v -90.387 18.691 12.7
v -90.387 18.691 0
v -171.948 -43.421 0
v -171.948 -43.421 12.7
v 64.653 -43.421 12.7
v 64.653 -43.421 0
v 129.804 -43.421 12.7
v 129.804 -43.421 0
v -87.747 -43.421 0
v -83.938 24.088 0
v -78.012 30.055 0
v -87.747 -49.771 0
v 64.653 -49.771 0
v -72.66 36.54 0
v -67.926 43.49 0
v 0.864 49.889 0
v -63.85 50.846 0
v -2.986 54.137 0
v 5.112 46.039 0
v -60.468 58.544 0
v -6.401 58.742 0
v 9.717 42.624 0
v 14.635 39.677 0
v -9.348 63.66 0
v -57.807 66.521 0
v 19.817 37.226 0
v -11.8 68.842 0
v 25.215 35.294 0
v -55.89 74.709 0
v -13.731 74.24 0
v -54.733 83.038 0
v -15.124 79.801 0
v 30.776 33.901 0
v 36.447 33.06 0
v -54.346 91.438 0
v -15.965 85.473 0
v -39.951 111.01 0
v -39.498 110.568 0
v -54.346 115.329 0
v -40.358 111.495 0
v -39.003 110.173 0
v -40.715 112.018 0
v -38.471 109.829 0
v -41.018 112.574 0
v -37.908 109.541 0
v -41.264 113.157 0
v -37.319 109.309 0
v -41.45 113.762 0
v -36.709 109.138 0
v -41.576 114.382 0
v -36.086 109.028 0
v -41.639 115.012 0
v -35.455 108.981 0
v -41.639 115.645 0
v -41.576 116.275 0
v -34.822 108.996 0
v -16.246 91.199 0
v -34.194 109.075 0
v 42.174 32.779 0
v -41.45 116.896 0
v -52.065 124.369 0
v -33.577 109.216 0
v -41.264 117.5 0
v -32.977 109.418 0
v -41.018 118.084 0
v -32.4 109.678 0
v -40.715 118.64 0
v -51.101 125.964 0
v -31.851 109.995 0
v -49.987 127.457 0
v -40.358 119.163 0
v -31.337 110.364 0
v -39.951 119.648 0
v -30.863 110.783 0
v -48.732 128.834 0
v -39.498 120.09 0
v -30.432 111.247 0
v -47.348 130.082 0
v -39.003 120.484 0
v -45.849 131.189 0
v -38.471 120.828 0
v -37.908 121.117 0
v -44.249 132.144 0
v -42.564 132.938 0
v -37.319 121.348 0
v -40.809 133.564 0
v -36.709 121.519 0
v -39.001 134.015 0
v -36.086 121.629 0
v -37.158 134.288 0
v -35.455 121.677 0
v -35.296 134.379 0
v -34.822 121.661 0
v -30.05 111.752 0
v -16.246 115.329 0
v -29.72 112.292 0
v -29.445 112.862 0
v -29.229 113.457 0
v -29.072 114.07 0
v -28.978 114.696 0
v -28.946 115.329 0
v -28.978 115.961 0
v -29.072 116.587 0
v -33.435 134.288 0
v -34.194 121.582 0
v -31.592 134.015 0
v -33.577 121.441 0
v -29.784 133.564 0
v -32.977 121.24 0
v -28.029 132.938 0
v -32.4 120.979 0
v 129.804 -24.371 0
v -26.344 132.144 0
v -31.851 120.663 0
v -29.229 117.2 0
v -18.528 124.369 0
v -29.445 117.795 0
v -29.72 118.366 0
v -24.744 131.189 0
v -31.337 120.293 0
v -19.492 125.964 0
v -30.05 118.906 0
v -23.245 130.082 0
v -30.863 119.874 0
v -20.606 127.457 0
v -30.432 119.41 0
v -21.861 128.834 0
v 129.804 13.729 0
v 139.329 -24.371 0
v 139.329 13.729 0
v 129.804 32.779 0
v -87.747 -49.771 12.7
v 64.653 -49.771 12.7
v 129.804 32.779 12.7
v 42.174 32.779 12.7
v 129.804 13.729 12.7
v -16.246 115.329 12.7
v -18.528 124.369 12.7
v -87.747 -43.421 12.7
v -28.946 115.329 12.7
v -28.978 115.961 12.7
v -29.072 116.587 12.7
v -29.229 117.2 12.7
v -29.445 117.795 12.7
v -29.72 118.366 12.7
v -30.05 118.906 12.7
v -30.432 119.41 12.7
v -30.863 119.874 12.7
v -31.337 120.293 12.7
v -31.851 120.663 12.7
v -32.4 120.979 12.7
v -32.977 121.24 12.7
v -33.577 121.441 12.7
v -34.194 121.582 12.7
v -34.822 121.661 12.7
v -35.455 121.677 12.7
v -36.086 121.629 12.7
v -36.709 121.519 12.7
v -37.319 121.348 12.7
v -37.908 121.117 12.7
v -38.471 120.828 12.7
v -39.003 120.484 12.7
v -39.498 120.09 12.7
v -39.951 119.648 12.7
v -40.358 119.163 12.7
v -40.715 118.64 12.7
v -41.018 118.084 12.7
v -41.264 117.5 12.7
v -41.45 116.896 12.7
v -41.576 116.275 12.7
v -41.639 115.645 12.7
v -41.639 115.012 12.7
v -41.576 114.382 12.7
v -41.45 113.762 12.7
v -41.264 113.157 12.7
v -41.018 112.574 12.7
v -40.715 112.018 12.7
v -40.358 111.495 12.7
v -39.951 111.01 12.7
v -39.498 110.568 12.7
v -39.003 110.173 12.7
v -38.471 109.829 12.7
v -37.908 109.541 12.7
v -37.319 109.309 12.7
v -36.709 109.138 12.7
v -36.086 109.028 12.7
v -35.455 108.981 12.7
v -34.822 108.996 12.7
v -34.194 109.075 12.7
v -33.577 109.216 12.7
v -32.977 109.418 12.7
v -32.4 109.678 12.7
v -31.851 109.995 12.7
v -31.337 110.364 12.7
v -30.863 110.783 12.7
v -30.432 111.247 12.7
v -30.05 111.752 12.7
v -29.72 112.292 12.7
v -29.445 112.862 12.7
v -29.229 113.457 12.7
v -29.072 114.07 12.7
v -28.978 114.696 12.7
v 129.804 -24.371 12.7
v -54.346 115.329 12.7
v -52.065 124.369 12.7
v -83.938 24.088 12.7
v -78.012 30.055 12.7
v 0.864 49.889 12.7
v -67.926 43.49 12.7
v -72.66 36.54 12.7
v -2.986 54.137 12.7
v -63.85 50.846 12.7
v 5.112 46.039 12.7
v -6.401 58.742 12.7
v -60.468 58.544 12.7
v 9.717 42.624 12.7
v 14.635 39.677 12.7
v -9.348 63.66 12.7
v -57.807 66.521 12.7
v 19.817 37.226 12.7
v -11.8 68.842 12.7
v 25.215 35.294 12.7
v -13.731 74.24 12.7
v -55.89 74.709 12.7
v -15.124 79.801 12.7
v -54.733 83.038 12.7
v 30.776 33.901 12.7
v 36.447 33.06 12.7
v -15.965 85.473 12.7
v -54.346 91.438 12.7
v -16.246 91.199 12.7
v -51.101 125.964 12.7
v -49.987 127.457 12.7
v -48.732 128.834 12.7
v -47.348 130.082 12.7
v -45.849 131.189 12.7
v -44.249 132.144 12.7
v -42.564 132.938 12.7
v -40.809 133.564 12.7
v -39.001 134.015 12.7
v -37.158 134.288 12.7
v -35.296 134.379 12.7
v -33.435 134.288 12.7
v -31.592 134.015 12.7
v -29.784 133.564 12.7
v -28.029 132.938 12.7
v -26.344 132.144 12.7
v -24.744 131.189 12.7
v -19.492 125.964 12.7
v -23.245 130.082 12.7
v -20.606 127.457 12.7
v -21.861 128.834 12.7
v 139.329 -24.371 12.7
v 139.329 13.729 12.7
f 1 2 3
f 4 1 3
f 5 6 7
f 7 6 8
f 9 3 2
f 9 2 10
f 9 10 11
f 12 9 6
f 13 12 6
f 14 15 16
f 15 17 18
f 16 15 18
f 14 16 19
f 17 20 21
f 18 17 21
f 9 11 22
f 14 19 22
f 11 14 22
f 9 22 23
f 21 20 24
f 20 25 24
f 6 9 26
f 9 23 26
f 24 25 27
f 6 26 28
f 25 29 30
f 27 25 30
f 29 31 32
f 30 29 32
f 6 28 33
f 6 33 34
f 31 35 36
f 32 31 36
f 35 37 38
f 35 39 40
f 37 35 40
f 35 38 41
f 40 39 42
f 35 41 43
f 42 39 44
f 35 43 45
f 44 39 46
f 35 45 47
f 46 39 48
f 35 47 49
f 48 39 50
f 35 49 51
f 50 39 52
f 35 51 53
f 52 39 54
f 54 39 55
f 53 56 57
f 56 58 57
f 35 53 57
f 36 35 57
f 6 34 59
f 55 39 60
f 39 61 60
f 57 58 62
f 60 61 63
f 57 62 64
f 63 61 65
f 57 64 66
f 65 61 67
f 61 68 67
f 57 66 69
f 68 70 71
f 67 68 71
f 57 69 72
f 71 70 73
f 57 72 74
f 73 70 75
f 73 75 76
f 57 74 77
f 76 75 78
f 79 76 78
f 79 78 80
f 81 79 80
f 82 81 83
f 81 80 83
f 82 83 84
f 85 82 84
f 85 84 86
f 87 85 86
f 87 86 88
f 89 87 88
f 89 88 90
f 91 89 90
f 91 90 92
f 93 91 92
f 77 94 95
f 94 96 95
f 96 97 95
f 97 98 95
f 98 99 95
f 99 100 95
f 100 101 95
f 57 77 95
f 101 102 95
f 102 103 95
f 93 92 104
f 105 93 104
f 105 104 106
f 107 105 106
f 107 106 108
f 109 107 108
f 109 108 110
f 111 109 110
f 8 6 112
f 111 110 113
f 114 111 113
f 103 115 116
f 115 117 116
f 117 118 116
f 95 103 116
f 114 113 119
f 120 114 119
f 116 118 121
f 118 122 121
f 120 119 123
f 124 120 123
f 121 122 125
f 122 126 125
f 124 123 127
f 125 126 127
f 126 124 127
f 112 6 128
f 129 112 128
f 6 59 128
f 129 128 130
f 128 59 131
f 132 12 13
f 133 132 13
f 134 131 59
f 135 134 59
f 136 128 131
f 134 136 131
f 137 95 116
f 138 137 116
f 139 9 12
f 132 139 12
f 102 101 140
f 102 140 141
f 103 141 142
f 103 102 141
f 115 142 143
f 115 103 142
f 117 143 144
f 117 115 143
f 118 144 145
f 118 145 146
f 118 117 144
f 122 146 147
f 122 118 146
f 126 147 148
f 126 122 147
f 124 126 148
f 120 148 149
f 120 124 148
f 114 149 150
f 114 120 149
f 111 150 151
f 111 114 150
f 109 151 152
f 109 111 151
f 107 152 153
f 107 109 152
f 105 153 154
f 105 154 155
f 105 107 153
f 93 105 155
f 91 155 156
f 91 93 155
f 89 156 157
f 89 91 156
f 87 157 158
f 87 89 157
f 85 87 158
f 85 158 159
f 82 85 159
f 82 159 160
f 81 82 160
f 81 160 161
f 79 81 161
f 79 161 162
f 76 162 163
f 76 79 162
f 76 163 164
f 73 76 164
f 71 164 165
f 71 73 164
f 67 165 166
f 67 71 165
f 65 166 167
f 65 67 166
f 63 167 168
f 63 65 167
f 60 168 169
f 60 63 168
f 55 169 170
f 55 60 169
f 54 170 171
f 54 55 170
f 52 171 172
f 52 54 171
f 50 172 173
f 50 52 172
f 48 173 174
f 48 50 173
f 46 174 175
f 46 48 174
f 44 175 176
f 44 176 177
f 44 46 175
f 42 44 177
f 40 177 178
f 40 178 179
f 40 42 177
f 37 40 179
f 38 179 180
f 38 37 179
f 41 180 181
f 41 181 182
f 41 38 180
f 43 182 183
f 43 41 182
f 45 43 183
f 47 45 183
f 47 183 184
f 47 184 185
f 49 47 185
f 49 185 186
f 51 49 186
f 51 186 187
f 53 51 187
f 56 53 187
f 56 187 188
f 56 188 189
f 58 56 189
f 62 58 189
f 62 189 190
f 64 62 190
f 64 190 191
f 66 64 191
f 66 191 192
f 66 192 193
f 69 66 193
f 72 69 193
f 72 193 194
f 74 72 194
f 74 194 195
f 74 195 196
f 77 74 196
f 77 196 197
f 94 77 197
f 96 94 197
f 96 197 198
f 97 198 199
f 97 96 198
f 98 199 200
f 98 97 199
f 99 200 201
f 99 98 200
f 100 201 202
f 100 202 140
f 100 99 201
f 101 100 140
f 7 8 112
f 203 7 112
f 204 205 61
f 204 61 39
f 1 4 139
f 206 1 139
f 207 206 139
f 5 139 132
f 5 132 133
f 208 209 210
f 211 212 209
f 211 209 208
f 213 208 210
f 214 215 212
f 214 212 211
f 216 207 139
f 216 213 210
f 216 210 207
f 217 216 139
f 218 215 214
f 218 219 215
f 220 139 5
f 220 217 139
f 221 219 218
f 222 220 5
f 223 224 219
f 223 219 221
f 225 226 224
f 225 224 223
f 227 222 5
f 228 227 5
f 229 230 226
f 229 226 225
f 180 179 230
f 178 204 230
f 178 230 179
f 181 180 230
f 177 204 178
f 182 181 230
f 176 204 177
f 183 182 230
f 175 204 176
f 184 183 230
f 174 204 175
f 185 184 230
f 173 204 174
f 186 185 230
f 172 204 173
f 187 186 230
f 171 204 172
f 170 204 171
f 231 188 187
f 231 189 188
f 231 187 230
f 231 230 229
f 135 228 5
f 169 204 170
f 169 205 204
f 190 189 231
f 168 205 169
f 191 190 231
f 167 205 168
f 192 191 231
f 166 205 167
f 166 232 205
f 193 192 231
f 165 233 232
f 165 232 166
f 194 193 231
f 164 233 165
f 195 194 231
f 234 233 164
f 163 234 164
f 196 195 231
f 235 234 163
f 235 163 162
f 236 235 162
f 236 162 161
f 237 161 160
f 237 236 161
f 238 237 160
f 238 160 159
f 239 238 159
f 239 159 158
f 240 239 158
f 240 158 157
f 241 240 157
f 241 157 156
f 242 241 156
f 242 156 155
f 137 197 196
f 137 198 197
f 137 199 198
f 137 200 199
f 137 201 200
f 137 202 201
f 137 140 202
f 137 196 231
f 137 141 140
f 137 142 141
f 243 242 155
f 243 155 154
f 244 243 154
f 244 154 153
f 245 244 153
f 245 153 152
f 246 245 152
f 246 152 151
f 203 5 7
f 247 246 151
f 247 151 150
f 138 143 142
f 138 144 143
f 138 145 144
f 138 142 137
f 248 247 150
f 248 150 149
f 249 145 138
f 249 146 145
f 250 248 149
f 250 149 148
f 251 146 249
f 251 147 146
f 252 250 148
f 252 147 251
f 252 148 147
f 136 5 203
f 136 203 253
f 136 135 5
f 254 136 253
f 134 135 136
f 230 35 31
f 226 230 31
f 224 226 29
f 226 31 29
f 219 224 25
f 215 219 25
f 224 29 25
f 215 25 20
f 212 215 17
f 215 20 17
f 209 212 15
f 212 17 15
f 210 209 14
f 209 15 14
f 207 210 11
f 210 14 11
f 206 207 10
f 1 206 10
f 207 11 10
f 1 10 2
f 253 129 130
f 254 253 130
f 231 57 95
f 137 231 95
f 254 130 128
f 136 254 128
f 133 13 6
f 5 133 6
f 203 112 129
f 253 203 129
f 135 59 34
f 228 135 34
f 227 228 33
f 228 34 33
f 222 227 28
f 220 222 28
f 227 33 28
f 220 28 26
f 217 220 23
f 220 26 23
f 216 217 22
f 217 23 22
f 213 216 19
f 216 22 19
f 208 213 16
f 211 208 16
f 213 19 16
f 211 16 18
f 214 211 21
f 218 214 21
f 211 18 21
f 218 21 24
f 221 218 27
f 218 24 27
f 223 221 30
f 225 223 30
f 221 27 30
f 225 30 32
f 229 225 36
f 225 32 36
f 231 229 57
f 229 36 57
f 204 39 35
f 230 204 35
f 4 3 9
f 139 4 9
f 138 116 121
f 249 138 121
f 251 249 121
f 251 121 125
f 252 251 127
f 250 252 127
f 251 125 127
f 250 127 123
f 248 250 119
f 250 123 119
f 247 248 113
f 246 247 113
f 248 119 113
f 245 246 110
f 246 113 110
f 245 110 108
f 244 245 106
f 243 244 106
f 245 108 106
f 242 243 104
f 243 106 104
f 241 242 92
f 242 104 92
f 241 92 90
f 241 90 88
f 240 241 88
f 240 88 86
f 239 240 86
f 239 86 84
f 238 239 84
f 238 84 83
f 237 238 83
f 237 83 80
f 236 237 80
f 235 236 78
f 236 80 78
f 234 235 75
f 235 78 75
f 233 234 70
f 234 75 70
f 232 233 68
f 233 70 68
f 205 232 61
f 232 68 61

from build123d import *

# Parameters (mm, degrees)
SKETCH1_R           = 6.35
BOSS_EXTRUDE1_DEPTH = 12.7


with BuildPart() as part:
    # Sketch1 → Boss-Extrude1 (new body)
    with BuildSketch(Plane.XY):
        with BuildLine():
            Line((129.803523023, 13.72866743), (129.803523023, 32.77866743))
            Line((129.803523023, 32.77866743), (104.403523023, 32.77866743))
            Line((104.403523023, 32.77866743), (89.290523023, 32.77866743))
            Line((89.290523023, 32.77866743), (51.190523023, 32.77866743))
            Line((51.190523023, 32.77866743), (44.078523023, 32.77866743))
            Line((44.078523023, 32.77866743), (42.173523023, 32.77866743))
            ThreePointArc((42.173523023, 32.77866743), (0.864344867, 49.889489273), (-16.246476977, 91.19866743))
            Line((-16.246476977, 91.19866743), (-16.246476977, 115.32866743))
            Line((-16.246476977, 115.32866743), (-18.528129693, 124.368857105))
            ThreePointArc((-18.528129693, 124.368857105), (-35.296476977, 134.37866743), (-52.064824261, 124.368857105))
            Line((-52.064824261, 124.368857105), (-54.346476977, 115.32866743))
            Line((-54.346476977, 115.32866743), (-54.346476977, 91.438289009))
            ThreePointArc((-54.346476977, 91.438289009), (-63.850433524, 50.845698757), (-90.386686587, 18.691214671))
            Line((-90.386686587, 18.691214671), (-171.948476977, -43.42133257))
            Line((-171.948476977, -43.42133257), (-87.747476977, -43.42133257))
            Line((-87.747476977, -43.42133257), (-87.747476977, -49.77133257))
            Line((-87.747476977, -49.77133257), (-61.229320991, -49.77133257))
            Line((-61.229320991, -49.77133257), (-16.694588765, -49.77133257))
            Line((-16.694588765, -49.77133257), (64.652523023, -49.77133257))
            Line((64.652523023, -49.77133257), (64.652523023, -43.42133257))
            Line((64.652523023, -43.42133257), (129.803523023, -43.42133257))
            Line((129.803523023, -43.42133257), (129.803523023, -24.37133257))
            Line((129.803523023, -24.37133257), (139.328523023, -24.37133257))
            Line((139.328523023, -24.37133257), (139.328523023, 13.72866743))
            Line((139.328523023, 13.72866743), (129.803523023, 13.72866743))
        make_face()
        with Locations((-35.296476977, 115.32866743)):
            Circle(SKETCH1_R, mode=Mode.SUBTRACT)
    extrude(amount=BOSS_EXTRUDE1_DEPTH)


solid = part.part
